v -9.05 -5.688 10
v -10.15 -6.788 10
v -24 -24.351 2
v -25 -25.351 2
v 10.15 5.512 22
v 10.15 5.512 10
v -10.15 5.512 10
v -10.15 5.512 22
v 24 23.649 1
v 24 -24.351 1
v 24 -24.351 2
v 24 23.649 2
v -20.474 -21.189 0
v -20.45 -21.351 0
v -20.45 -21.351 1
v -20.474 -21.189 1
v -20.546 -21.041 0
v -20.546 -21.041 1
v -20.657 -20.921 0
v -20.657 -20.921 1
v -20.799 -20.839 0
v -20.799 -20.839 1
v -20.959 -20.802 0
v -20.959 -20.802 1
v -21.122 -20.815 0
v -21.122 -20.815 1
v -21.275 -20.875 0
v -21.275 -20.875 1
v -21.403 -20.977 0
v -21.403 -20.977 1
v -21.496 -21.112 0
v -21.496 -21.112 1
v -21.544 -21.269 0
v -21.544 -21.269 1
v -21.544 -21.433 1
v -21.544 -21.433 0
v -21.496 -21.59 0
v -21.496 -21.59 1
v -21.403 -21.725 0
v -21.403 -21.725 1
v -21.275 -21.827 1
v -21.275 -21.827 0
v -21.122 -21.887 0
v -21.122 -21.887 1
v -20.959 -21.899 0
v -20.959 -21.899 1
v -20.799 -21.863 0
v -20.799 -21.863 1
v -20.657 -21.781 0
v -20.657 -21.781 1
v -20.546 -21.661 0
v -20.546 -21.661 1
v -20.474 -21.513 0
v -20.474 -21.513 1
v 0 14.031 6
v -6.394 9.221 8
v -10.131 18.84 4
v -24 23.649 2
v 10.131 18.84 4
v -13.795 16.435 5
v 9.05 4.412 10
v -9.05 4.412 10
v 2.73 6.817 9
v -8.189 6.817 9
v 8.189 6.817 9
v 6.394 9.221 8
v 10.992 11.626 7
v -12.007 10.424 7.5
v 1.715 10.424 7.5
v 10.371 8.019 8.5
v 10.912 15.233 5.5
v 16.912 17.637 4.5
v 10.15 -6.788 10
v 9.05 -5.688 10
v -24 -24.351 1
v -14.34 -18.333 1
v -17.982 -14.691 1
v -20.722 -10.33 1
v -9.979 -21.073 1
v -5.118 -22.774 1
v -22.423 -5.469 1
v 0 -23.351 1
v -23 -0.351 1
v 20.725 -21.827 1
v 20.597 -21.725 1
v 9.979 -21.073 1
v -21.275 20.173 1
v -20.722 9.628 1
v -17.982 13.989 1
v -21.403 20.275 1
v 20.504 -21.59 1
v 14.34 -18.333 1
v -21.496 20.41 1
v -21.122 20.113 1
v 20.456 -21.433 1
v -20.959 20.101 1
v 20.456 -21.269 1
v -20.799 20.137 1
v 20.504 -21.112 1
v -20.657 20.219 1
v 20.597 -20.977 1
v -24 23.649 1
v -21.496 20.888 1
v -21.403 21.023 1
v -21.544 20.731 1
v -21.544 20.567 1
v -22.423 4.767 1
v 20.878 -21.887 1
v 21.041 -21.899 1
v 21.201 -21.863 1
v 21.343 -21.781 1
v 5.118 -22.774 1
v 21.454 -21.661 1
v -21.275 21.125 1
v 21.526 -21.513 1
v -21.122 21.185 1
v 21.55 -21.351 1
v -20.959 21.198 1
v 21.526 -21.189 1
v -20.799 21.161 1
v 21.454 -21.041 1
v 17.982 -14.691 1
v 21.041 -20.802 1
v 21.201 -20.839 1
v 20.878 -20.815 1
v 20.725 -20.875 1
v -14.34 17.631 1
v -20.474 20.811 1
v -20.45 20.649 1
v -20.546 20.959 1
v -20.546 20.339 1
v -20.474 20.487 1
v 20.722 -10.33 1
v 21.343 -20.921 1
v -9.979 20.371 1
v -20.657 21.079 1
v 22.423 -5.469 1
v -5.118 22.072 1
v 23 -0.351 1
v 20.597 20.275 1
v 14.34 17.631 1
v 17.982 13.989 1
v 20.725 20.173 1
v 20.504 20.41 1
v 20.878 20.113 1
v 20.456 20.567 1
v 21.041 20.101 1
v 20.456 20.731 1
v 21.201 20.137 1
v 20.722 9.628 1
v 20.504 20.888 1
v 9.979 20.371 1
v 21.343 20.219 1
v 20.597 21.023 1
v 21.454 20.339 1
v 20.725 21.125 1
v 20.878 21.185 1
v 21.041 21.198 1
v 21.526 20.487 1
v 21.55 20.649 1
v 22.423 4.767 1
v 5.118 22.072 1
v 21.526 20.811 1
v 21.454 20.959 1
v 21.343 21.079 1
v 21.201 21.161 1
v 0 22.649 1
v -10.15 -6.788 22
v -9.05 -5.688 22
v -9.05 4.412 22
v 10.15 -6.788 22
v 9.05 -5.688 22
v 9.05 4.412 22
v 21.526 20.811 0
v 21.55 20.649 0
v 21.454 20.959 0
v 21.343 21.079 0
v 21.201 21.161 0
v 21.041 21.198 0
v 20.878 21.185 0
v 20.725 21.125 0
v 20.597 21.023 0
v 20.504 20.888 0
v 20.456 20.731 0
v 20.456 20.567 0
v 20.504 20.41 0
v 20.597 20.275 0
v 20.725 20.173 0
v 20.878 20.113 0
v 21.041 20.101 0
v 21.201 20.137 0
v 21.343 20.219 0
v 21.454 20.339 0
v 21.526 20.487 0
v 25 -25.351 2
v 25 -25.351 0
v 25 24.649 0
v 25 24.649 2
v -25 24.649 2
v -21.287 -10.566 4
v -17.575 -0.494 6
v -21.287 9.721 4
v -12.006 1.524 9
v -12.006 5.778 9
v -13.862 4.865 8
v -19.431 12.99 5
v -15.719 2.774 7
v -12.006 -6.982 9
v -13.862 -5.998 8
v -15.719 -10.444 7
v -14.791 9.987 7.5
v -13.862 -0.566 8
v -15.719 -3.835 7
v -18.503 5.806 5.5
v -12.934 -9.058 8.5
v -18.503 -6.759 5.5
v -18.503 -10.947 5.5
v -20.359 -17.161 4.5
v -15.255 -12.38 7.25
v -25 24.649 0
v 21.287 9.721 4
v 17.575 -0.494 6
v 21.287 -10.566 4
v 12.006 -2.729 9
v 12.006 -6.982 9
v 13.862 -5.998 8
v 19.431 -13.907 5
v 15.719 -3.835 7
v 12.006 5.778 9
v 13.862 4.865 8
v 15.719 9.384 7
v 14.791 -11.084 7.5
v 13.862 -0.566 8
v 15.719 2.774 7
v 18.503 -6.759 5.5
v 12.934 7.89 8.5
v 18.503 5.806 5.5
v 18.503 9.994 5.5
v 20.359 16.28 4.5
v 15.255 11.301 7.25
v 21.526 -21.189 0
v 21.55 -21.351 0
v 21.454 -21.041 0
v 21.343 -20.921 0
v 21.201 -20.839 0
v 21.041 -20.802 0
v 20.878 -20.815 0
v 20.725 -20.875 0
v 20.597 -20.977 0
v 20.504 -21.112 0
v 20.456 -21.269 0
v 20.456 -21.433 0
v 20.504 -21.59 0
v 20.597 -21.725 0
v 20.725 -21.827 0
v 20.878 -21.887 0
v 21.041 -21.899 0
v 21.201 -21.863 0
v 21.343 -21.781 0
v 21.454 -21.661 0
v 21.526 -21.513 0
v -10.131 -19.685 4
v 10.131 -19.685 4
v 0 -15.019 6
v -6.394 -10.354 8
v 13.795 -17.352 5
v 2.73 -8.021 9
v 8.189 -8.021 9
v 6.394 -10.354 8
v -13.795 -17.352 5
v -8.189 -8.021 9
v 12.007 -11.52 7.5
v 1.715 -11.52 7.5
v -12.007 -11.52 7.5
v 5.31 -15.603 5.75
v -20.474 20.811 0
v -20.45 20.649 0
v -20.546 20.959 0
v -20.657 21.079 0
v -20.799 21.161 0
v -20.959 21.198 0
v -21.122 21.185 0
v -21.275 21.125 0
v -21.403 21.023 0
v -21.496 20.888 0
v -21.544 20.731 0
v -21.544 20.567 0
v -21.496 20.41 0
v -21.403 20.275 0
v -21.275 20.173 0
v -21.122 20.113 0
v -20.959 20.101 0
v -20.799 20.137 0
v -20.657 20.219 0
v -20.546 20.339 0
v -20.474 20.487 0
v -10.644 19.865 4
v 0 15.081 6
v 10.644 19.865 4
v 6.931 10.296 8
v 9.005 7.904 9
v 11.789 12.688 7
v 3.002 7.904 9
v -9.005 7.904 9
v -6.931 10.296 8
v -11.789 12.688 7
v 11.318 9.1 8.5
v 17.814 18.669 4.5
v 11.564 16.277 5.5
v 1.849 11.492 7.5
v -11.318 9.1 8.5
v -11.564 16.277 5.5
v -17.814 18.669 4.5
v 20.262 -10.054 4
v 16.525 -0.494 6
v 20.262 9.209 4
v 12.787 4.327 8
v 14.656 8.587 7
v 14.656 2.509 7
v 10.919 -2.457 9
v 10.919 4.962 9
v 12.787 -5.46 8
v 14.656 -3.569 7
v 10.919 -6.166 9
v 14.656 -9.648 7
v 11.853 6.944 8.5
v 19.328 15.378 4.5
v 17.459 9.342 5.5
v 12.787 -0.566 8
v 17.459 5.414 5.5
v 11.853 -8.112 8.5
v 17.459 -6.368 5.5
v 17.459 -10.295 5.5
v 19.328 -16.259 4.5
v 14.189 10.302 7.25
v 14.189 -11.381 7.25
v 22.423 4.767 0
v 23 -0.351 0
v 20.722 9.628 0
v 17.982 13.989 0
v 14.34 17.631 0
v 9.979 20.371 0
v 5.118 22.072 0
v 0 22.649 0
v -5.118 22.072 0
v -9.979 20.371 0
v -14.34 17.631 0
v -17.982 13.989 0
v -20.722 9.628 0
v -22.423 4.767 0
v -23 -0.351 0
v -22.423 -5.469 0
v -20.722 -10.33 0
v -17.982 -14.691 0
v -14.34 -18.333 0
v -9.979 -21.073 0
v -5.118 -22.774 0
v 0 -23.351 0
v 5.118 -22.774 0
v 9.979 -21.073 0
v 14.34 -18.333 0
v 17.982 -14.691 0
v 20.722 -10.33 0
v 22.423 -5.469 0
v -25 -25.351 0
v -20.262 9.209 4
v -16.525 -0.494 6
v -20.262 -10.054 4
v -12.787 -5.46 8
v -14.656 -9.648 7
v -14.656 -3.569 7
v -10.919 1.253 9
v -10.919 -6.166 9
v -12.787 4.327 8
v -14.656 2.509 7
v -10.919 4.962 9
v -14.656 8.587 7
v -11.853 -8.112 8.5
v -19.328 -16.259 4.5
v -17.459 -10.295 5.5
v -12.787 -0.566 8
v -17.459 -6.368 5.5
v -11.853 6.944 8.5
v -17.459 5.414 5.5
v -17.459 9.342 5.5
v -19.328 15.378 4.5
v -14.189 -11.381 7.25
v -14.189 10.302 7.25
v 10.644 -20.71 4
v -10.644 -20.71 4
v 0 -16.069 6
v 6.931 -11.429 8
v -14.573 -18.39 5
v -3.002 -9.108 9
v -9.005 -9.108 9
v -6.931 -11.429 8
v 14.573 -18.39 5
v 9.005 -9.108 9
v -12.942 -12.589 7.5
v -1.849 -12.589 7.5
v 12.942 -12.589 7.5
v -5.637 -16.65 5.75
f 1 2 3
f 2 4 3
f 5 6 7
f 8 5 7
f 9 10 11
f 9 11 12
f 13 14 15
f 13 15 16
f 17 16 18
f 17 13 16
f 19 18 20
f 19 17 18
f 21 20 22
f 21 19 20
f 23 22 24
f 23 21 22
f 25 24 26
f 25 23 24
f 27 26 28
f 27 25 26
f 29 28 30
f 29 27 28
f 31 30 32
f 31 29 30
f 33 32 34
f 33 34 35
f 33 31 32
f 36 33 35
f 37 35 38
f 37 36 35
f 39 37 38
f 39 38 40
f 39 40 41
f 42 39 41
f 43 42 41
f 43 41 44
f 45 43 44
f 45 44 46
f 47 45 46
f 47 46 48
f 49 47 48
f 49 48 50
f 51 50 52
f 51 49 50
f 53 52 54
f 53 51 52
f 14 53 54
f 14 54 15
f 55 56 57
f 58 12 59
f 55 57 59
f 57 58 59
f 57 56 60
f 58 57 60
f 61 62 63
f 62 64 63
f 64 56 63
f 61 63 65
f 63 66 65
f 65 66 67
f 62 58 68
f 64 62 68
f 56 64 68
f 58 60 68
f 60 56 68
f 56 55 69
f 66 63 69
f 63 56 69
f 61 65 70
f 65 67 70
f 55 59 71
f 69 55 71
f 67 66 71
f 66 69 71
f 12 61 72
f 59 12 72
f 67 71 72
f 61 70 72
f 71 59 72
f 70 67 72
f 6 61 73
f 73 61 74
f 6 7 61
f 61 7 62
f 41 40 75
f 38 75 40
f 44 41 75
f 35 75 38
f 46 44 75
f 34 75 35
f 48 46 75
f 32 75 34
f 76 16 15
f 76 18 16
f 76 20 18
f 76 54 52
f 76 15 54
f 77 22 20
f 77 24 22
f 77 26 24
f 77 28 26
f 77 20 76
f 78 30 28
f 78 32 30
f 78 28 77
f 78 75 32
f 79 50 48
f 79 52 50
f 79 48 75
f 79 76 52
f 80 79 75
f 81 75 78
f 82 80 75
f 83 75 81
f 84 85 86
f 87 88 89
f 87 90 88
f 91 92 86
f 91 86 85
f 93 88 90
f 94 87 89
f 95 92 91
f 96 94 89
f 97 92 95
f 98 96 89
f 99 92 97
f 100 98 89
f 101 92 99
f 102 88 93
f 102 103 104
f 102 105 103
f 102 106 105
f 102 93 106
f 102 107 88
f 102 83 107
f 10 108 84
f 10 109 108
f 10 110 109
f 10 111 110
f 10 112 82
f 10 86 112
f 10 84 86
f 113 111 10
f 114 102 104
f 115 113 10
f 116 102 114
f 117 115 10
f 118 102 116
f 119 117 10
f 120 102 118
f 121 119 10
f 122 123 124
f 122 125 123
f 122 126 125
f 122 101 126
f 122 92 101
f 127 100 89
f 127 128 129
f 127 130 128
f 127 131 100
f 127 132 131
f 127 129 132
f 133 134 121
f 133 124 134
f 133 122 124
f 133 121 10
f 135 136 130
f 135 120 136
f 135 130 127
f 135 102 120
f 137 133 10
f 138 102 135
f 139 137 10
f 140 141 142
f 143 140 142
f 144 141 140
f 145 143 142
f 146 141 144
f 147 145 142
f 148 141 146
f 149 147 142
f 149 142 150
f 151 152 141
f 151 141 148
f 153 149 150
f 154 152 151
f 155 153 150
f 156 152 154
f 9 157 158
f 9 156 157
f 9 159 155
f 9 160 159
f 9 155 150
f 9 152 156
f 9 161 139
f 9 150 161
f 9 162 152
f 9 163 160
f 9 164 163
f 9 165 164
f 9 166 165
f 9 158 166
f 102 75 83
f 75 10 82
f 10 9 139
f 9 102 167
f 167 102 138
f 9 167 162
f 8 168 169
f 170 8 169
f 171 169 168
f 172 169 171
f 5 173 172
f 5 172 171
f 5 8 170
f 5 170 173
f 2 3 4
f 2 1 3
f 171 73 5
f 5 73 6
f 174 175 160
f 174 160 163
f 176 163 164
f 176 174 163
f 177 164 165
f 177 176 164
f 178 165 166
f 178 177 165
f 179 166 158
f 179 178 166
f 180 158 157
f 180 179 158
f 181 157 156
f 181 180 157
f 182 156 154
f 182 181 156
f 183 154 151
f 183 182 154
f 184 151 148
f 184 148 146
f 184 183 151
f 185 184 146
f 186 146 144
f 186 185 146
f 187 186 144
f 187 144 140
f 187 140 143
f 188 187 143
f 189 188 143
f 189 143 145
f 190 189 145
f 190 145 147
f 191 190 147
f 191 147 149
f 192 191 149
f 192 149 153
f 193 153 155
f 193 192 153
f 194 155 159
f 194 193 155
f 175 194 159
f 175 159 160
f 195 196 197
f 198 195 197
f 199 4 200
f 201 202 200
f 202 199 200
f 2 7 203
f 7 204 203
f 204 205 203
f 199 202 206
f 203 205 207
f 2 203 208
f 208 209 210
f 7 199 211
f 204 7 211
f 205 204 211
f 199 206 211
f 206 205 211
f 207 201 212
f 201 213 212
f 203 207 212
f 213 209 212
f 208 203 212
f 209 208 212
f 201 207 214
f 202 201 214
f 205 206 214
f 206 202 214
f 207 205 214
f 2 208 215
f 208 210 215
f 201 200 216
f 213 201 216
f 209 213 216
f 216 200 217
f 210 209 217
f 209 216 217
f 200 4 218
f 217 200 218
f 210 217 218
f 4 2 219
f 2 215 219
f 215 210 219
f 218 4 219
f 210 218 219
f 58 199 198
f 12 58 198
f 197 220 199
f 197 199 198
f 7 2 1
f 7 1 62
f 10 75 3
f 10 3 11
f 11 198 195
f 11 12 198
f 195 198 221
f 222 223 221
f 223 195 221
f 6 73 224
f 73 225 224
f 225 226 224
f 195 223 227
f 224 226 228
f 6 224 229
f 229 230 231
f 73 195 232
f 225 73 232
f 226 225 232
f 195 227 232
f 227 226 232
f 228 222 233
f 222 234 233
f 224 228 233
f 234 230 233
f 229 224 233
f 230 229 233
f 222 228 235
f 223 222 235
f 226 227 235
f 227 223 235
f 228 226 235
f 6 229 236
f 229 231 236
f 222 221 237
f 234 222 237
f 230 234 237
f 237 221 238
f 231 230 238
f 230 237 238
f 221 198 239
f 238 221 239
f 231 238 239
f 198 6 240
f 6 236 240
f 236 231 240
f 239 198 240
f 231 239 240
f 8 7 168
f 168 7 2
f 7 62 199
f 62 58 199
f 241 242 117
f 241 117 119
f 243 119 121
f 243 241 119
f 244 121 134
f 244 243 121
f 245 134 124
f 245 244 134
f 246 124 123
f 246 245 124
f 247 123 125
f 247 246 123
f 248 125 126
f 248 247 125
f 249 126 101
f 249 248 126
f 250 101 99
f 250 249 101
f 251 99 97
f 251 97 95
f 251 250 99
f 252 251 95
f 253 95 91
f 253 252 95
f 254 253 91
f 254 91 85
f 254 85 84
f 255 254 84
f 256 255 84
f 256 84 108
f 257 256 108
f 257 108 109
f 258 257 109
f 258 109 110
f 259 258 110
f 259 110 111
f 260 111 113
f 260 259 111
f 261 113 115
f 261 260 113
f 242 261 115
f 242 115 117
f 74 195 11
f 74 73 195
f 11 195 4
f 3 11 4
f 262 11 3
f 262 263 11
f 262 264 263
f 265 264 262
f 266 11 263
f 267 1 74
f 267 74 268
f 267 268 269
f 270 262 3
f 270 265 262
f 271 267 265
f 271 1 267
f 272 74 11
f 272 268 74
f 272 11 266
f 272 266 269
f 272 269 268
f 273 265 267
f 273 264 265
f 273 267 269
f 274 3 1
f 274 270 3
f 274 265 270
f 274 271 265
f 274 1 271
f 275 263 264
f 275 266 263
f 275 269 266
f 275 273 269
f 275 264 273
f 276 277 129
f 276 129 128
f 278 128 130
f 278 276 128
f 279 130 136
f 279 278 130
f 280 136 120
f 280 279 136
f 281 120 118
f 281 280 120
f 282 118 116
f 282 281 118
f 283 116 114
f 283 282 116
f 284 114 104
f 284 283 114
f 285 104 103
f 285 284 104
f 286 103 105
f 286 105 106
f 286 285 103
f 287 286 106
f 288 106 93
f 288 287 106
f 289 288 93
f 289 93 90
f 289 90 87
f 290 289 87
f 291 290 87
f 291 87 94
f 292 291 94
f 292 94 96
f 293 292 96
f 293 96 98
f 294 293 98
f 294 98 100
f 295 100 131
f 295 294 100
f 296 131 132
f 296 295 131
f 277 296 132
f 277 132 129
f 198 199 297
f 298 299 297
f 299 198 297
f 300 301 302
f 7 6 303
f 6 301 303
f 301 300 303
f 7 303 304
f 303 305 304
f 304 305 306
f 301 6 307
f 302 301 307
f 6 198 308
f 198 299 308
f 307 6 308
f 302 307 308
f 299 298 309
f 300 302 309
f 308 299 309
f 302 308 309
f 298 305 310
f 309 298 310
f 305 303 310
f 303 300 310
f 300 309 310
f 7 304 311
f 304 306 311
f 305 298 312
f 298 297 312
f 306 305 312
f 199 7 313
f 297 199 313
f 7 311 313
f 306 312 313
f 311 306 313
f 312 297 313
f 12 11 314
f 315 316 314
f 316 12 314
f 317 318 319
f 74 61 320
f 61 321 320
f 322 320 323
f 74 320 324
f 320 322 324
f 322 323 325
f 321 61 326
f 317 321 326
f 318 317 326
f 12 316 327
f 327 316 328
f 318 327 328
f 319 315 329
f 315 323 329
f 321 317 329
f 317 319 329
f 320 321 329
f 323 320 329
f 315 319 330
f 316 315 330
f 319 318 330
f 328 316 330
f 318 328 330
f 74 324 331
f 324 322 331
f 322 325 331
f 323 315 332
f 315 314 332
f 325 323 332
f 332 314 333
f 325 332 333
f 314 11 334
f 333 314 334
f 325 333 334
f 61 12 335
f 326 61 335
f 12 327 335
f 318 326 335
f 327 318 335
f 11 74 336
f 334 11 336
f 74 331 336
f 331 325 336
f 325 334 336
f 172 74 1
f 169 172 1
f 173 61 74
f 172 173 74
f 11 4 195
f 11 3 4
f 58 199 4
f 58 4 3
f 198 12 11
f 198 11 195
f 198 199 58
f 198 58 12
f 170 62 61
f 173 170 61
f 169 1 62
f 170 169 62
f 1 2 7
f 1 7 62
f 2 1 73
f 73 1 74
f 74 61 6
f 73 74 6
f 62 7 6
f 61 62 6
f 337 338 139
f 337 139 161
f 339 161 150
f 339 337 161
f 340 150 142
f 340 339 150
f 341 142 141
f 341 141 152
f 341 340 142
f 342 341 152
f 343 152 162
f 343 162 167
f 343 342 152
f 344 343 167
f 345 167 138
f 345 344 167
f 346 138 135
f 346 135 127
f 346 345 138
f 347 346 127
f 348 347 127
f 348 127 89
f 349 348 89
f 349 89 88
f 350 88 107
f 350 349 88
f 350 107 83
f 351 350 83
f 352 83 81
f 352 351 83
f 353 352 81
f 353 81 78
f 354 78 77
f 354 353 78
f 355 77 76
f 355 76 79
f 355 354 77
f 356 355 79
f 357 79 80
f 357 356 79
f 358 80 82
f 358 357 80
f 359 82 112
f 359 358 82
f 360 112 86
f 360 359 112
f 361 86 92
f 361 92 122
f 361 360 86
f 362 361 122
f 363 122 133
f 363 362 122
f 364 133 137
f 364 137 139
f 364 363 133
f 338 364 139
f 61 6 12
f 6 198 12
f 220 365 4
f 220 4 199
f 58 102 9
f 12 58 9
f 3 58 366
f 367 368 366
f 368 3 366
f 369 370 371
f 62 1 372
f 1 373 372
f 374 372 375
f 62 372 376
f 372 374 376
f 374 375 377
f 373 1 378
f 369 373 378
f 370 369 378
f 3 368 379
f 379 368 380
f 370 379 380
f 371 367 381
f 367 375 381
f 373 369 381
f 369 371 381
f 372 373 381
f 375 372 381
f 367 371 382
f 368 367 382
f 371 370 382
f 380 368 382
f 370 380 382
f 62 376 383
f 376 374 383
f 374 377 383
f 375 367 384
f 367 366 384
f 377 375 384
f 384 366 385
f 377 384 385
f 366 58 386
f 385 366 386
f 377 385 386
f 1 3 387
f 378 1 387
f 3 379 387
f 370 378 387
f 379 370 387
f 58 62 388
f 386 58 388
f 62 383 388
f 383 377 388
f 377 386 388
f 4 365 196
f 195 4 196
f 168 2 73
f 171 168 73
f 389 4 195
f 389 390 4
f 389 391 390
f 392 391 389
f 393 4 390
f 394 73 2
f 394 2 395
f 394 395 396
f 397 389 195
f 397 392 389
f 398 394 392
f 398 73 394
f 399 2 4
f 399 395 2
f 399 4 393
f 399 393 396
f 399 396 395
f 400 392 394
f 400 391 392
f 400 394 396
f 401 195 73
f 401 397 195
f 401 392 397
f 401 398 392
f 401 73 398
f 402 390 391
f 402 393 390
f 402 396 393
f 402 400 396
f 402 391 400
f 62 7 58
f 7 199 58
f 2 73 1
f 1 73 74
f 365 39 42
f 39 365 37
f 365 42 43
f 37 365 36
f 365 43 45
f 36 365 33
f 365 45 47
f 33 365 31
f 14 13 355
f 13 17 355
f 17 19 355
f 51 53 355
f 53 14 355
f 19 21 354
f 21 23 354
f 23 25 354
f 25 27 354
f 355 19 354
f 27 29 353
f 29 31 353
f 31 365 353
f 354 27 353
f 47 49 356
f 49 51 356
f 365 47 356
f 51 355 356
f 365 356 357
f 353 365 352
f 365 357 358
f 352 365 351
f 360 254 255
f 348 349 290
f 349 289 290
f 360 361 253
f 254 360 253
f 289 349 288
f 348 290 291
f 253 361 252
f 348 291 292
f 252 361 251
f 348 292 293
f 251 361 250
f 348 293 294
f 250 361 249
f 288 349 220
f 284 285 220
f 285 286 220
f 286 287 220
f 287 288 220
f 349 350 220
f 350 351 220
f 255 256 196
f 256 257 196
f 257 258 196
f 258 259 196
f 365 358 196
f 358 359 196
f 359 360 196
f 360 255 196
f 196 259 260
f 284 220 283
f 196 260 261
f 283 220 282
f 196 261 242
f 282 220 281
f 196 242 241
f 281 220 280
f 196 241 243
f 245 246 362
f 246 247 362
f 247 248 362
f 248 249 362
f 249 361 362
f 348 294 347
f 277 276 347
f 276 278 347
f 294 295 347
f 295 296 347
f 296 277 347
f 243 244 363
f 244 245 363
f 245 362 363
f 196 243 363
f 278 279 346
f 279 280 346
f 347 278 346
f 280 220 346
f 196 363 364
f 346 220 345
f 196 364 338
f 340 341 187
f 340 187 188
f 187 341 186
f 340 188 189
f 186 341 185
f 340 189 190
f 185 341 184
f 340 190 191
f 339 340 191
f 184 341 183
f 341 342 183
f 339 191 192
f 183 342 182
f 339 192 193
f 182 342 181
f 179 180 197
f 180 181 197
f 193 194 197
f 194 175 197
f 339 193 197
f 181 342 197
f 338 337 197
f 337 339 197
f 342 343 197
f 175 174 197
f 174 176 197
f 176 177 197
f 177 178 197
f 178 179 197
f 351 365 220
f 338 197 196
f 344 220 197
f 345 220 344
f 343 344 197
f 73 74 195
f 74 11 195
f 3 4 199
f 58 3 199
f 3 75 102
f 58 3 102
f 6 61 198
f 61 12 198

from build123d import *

# Parameters (mm, degrees)
F0_W     = 50
F0_H     = 50
F0_W_2   = 48
F0_H_2   = 48
F1_DEPTH = 2
F0_R     = 0.55
F0_R_2   = 23
F2_DEPTH = 1
F5_DEPTH = 12


with BuildPart() as f1:
    # F0 (on Top) → F1 (new body)
    with BuildSketch(Plane.XY):
        with Locations((0, -0.350917)):
            Rectangle(F0_W, F0_H)
        with Locations((0, -0.350917)):
            Rectangle(F0_W_2, F0_H_2, mode=Mode.SUBTRACT)
    extrude(amount=F1_DEPTH)

    # F0 (on Top) → F2 (join)
    with BuildSketch(Plane.XY):
        with Locations((0, -0.350917)):
            Rectangle(F0_W_2, F0_H_2)
        with Locations((-21, -21.350917)):
            Circle(F0_R, mode=Mode.SUBTRACT)
        with Locations((21, -21.350917)):
            Circle(F0_R, mode=Mode.SUBTRACT)
        with Locations((-21, 20.649083)):
            Circle(F0_R, mode=Mode.SUBTRACT)
        with Locations((0, -0.350917)):
            Circle(F0_R_2, mode=Mode.SUBTRACT)
        with Locations((21, 20.649083)):
            Circle(F0_R, mode=Mode.SUBTRACT)
    extrude(amount=F2_DEPTH)


with BuildPart() as f5:
    # F4 (on offset) → F5 (new body)
    with BuildSketch(Plane.XY.offset(10)):
        Polygon((10.15, 5.511968), (9.05, 4.411968), (9.05, -5.688032), (10.15, -6.788032), align=None)
        Polygon((-9.05, 4.411968), (9.05, 4.411968), (10.15, 5.511968), (-10.15, 5.511968), align=None)
        Polygon((-9.05, -5.688032), (-9.05, 4.411968), (-10.15, 5.511968), (-10.15, -6.788032), align=None)
        Polygon((10.15, -6.788032), (9.05, -5.688032), (-9.05, -5.688032), (-10.15, -6.788032), align=None)
    extrude(amount=F5_DEPTH)


with BuildPart() as f7:
    # F4 (on offset) → F7 section 0
    with BuildSketch(Plane.XY.offset(10)):
        Polygon((-9.05, 4.411968), (9.05, 4.411968), (10.15, 5.511968), (-10.15, 5.511968), align=None)
    # F6 (on face) → F7 section 1
    with BuildSketch(Plane.XY.offset(2)):
        Polygon((-25, 24.649083), (-24, 23.649083), (24, 23.649083), (25, 24.649083), align=None)
    loft()


with BuildPart() as f8:
    # F6 (on face) → F8 section 0
    with BuildSketch(Plane.XY.offset(2)):
        Polygon((24, -24.350917), (-24, -24.350917), (-25, -25.350917), (25, -25.350917), align=None)
    # F4 (on offset) → F8 section 1
    with BuildSketch(Plane.XY.offset(10)):
        Polygon((10.15, -6.788032), (9.05, -5.688032), (-9.05, -5.688032), (-10.15, -6.788032), align=None)
    loft()


with BuildPart() as f9:
    # F4 (on offset) → F9 section 0
    with BuildSketch(Plane.XY.offset(10)):
        Polygon((10.15, 5.511968), (9.05, 4.411968), (9.05, -5.688032), (10.15, -6.788032), align=None)
    # F6 (on face) → F9 section 1
    with BuildSketch(Plane.XY.offset(2)):
        Polygon((24, 23.649083), (24, -24.350917), (25, -25.350917), (25, 24.649083), align=None)
    loft()


with BuildPart() as f10:
    # F4 (on offset) → F10 section 0
    with BuildSketch(Plane.XY.offset(10)):
        Polygon((-9.05, -5.688032), (-9.05, 4.411968), (-10.15, 5.511968), (-10.15, -6.788032), align=None)
    # F6 (on face) → F10 section 1
    with BuildSketch(Plane.XY.offset(2)):
        Polygon((-25, -25.350917), (-24, -24.350917), (-24, 23.649083), (-25, 24.649083), align=None)
    loft()


solid = Compound([f1.part, f5.part, f7.part, f8.part, f9.part, f10.part])
